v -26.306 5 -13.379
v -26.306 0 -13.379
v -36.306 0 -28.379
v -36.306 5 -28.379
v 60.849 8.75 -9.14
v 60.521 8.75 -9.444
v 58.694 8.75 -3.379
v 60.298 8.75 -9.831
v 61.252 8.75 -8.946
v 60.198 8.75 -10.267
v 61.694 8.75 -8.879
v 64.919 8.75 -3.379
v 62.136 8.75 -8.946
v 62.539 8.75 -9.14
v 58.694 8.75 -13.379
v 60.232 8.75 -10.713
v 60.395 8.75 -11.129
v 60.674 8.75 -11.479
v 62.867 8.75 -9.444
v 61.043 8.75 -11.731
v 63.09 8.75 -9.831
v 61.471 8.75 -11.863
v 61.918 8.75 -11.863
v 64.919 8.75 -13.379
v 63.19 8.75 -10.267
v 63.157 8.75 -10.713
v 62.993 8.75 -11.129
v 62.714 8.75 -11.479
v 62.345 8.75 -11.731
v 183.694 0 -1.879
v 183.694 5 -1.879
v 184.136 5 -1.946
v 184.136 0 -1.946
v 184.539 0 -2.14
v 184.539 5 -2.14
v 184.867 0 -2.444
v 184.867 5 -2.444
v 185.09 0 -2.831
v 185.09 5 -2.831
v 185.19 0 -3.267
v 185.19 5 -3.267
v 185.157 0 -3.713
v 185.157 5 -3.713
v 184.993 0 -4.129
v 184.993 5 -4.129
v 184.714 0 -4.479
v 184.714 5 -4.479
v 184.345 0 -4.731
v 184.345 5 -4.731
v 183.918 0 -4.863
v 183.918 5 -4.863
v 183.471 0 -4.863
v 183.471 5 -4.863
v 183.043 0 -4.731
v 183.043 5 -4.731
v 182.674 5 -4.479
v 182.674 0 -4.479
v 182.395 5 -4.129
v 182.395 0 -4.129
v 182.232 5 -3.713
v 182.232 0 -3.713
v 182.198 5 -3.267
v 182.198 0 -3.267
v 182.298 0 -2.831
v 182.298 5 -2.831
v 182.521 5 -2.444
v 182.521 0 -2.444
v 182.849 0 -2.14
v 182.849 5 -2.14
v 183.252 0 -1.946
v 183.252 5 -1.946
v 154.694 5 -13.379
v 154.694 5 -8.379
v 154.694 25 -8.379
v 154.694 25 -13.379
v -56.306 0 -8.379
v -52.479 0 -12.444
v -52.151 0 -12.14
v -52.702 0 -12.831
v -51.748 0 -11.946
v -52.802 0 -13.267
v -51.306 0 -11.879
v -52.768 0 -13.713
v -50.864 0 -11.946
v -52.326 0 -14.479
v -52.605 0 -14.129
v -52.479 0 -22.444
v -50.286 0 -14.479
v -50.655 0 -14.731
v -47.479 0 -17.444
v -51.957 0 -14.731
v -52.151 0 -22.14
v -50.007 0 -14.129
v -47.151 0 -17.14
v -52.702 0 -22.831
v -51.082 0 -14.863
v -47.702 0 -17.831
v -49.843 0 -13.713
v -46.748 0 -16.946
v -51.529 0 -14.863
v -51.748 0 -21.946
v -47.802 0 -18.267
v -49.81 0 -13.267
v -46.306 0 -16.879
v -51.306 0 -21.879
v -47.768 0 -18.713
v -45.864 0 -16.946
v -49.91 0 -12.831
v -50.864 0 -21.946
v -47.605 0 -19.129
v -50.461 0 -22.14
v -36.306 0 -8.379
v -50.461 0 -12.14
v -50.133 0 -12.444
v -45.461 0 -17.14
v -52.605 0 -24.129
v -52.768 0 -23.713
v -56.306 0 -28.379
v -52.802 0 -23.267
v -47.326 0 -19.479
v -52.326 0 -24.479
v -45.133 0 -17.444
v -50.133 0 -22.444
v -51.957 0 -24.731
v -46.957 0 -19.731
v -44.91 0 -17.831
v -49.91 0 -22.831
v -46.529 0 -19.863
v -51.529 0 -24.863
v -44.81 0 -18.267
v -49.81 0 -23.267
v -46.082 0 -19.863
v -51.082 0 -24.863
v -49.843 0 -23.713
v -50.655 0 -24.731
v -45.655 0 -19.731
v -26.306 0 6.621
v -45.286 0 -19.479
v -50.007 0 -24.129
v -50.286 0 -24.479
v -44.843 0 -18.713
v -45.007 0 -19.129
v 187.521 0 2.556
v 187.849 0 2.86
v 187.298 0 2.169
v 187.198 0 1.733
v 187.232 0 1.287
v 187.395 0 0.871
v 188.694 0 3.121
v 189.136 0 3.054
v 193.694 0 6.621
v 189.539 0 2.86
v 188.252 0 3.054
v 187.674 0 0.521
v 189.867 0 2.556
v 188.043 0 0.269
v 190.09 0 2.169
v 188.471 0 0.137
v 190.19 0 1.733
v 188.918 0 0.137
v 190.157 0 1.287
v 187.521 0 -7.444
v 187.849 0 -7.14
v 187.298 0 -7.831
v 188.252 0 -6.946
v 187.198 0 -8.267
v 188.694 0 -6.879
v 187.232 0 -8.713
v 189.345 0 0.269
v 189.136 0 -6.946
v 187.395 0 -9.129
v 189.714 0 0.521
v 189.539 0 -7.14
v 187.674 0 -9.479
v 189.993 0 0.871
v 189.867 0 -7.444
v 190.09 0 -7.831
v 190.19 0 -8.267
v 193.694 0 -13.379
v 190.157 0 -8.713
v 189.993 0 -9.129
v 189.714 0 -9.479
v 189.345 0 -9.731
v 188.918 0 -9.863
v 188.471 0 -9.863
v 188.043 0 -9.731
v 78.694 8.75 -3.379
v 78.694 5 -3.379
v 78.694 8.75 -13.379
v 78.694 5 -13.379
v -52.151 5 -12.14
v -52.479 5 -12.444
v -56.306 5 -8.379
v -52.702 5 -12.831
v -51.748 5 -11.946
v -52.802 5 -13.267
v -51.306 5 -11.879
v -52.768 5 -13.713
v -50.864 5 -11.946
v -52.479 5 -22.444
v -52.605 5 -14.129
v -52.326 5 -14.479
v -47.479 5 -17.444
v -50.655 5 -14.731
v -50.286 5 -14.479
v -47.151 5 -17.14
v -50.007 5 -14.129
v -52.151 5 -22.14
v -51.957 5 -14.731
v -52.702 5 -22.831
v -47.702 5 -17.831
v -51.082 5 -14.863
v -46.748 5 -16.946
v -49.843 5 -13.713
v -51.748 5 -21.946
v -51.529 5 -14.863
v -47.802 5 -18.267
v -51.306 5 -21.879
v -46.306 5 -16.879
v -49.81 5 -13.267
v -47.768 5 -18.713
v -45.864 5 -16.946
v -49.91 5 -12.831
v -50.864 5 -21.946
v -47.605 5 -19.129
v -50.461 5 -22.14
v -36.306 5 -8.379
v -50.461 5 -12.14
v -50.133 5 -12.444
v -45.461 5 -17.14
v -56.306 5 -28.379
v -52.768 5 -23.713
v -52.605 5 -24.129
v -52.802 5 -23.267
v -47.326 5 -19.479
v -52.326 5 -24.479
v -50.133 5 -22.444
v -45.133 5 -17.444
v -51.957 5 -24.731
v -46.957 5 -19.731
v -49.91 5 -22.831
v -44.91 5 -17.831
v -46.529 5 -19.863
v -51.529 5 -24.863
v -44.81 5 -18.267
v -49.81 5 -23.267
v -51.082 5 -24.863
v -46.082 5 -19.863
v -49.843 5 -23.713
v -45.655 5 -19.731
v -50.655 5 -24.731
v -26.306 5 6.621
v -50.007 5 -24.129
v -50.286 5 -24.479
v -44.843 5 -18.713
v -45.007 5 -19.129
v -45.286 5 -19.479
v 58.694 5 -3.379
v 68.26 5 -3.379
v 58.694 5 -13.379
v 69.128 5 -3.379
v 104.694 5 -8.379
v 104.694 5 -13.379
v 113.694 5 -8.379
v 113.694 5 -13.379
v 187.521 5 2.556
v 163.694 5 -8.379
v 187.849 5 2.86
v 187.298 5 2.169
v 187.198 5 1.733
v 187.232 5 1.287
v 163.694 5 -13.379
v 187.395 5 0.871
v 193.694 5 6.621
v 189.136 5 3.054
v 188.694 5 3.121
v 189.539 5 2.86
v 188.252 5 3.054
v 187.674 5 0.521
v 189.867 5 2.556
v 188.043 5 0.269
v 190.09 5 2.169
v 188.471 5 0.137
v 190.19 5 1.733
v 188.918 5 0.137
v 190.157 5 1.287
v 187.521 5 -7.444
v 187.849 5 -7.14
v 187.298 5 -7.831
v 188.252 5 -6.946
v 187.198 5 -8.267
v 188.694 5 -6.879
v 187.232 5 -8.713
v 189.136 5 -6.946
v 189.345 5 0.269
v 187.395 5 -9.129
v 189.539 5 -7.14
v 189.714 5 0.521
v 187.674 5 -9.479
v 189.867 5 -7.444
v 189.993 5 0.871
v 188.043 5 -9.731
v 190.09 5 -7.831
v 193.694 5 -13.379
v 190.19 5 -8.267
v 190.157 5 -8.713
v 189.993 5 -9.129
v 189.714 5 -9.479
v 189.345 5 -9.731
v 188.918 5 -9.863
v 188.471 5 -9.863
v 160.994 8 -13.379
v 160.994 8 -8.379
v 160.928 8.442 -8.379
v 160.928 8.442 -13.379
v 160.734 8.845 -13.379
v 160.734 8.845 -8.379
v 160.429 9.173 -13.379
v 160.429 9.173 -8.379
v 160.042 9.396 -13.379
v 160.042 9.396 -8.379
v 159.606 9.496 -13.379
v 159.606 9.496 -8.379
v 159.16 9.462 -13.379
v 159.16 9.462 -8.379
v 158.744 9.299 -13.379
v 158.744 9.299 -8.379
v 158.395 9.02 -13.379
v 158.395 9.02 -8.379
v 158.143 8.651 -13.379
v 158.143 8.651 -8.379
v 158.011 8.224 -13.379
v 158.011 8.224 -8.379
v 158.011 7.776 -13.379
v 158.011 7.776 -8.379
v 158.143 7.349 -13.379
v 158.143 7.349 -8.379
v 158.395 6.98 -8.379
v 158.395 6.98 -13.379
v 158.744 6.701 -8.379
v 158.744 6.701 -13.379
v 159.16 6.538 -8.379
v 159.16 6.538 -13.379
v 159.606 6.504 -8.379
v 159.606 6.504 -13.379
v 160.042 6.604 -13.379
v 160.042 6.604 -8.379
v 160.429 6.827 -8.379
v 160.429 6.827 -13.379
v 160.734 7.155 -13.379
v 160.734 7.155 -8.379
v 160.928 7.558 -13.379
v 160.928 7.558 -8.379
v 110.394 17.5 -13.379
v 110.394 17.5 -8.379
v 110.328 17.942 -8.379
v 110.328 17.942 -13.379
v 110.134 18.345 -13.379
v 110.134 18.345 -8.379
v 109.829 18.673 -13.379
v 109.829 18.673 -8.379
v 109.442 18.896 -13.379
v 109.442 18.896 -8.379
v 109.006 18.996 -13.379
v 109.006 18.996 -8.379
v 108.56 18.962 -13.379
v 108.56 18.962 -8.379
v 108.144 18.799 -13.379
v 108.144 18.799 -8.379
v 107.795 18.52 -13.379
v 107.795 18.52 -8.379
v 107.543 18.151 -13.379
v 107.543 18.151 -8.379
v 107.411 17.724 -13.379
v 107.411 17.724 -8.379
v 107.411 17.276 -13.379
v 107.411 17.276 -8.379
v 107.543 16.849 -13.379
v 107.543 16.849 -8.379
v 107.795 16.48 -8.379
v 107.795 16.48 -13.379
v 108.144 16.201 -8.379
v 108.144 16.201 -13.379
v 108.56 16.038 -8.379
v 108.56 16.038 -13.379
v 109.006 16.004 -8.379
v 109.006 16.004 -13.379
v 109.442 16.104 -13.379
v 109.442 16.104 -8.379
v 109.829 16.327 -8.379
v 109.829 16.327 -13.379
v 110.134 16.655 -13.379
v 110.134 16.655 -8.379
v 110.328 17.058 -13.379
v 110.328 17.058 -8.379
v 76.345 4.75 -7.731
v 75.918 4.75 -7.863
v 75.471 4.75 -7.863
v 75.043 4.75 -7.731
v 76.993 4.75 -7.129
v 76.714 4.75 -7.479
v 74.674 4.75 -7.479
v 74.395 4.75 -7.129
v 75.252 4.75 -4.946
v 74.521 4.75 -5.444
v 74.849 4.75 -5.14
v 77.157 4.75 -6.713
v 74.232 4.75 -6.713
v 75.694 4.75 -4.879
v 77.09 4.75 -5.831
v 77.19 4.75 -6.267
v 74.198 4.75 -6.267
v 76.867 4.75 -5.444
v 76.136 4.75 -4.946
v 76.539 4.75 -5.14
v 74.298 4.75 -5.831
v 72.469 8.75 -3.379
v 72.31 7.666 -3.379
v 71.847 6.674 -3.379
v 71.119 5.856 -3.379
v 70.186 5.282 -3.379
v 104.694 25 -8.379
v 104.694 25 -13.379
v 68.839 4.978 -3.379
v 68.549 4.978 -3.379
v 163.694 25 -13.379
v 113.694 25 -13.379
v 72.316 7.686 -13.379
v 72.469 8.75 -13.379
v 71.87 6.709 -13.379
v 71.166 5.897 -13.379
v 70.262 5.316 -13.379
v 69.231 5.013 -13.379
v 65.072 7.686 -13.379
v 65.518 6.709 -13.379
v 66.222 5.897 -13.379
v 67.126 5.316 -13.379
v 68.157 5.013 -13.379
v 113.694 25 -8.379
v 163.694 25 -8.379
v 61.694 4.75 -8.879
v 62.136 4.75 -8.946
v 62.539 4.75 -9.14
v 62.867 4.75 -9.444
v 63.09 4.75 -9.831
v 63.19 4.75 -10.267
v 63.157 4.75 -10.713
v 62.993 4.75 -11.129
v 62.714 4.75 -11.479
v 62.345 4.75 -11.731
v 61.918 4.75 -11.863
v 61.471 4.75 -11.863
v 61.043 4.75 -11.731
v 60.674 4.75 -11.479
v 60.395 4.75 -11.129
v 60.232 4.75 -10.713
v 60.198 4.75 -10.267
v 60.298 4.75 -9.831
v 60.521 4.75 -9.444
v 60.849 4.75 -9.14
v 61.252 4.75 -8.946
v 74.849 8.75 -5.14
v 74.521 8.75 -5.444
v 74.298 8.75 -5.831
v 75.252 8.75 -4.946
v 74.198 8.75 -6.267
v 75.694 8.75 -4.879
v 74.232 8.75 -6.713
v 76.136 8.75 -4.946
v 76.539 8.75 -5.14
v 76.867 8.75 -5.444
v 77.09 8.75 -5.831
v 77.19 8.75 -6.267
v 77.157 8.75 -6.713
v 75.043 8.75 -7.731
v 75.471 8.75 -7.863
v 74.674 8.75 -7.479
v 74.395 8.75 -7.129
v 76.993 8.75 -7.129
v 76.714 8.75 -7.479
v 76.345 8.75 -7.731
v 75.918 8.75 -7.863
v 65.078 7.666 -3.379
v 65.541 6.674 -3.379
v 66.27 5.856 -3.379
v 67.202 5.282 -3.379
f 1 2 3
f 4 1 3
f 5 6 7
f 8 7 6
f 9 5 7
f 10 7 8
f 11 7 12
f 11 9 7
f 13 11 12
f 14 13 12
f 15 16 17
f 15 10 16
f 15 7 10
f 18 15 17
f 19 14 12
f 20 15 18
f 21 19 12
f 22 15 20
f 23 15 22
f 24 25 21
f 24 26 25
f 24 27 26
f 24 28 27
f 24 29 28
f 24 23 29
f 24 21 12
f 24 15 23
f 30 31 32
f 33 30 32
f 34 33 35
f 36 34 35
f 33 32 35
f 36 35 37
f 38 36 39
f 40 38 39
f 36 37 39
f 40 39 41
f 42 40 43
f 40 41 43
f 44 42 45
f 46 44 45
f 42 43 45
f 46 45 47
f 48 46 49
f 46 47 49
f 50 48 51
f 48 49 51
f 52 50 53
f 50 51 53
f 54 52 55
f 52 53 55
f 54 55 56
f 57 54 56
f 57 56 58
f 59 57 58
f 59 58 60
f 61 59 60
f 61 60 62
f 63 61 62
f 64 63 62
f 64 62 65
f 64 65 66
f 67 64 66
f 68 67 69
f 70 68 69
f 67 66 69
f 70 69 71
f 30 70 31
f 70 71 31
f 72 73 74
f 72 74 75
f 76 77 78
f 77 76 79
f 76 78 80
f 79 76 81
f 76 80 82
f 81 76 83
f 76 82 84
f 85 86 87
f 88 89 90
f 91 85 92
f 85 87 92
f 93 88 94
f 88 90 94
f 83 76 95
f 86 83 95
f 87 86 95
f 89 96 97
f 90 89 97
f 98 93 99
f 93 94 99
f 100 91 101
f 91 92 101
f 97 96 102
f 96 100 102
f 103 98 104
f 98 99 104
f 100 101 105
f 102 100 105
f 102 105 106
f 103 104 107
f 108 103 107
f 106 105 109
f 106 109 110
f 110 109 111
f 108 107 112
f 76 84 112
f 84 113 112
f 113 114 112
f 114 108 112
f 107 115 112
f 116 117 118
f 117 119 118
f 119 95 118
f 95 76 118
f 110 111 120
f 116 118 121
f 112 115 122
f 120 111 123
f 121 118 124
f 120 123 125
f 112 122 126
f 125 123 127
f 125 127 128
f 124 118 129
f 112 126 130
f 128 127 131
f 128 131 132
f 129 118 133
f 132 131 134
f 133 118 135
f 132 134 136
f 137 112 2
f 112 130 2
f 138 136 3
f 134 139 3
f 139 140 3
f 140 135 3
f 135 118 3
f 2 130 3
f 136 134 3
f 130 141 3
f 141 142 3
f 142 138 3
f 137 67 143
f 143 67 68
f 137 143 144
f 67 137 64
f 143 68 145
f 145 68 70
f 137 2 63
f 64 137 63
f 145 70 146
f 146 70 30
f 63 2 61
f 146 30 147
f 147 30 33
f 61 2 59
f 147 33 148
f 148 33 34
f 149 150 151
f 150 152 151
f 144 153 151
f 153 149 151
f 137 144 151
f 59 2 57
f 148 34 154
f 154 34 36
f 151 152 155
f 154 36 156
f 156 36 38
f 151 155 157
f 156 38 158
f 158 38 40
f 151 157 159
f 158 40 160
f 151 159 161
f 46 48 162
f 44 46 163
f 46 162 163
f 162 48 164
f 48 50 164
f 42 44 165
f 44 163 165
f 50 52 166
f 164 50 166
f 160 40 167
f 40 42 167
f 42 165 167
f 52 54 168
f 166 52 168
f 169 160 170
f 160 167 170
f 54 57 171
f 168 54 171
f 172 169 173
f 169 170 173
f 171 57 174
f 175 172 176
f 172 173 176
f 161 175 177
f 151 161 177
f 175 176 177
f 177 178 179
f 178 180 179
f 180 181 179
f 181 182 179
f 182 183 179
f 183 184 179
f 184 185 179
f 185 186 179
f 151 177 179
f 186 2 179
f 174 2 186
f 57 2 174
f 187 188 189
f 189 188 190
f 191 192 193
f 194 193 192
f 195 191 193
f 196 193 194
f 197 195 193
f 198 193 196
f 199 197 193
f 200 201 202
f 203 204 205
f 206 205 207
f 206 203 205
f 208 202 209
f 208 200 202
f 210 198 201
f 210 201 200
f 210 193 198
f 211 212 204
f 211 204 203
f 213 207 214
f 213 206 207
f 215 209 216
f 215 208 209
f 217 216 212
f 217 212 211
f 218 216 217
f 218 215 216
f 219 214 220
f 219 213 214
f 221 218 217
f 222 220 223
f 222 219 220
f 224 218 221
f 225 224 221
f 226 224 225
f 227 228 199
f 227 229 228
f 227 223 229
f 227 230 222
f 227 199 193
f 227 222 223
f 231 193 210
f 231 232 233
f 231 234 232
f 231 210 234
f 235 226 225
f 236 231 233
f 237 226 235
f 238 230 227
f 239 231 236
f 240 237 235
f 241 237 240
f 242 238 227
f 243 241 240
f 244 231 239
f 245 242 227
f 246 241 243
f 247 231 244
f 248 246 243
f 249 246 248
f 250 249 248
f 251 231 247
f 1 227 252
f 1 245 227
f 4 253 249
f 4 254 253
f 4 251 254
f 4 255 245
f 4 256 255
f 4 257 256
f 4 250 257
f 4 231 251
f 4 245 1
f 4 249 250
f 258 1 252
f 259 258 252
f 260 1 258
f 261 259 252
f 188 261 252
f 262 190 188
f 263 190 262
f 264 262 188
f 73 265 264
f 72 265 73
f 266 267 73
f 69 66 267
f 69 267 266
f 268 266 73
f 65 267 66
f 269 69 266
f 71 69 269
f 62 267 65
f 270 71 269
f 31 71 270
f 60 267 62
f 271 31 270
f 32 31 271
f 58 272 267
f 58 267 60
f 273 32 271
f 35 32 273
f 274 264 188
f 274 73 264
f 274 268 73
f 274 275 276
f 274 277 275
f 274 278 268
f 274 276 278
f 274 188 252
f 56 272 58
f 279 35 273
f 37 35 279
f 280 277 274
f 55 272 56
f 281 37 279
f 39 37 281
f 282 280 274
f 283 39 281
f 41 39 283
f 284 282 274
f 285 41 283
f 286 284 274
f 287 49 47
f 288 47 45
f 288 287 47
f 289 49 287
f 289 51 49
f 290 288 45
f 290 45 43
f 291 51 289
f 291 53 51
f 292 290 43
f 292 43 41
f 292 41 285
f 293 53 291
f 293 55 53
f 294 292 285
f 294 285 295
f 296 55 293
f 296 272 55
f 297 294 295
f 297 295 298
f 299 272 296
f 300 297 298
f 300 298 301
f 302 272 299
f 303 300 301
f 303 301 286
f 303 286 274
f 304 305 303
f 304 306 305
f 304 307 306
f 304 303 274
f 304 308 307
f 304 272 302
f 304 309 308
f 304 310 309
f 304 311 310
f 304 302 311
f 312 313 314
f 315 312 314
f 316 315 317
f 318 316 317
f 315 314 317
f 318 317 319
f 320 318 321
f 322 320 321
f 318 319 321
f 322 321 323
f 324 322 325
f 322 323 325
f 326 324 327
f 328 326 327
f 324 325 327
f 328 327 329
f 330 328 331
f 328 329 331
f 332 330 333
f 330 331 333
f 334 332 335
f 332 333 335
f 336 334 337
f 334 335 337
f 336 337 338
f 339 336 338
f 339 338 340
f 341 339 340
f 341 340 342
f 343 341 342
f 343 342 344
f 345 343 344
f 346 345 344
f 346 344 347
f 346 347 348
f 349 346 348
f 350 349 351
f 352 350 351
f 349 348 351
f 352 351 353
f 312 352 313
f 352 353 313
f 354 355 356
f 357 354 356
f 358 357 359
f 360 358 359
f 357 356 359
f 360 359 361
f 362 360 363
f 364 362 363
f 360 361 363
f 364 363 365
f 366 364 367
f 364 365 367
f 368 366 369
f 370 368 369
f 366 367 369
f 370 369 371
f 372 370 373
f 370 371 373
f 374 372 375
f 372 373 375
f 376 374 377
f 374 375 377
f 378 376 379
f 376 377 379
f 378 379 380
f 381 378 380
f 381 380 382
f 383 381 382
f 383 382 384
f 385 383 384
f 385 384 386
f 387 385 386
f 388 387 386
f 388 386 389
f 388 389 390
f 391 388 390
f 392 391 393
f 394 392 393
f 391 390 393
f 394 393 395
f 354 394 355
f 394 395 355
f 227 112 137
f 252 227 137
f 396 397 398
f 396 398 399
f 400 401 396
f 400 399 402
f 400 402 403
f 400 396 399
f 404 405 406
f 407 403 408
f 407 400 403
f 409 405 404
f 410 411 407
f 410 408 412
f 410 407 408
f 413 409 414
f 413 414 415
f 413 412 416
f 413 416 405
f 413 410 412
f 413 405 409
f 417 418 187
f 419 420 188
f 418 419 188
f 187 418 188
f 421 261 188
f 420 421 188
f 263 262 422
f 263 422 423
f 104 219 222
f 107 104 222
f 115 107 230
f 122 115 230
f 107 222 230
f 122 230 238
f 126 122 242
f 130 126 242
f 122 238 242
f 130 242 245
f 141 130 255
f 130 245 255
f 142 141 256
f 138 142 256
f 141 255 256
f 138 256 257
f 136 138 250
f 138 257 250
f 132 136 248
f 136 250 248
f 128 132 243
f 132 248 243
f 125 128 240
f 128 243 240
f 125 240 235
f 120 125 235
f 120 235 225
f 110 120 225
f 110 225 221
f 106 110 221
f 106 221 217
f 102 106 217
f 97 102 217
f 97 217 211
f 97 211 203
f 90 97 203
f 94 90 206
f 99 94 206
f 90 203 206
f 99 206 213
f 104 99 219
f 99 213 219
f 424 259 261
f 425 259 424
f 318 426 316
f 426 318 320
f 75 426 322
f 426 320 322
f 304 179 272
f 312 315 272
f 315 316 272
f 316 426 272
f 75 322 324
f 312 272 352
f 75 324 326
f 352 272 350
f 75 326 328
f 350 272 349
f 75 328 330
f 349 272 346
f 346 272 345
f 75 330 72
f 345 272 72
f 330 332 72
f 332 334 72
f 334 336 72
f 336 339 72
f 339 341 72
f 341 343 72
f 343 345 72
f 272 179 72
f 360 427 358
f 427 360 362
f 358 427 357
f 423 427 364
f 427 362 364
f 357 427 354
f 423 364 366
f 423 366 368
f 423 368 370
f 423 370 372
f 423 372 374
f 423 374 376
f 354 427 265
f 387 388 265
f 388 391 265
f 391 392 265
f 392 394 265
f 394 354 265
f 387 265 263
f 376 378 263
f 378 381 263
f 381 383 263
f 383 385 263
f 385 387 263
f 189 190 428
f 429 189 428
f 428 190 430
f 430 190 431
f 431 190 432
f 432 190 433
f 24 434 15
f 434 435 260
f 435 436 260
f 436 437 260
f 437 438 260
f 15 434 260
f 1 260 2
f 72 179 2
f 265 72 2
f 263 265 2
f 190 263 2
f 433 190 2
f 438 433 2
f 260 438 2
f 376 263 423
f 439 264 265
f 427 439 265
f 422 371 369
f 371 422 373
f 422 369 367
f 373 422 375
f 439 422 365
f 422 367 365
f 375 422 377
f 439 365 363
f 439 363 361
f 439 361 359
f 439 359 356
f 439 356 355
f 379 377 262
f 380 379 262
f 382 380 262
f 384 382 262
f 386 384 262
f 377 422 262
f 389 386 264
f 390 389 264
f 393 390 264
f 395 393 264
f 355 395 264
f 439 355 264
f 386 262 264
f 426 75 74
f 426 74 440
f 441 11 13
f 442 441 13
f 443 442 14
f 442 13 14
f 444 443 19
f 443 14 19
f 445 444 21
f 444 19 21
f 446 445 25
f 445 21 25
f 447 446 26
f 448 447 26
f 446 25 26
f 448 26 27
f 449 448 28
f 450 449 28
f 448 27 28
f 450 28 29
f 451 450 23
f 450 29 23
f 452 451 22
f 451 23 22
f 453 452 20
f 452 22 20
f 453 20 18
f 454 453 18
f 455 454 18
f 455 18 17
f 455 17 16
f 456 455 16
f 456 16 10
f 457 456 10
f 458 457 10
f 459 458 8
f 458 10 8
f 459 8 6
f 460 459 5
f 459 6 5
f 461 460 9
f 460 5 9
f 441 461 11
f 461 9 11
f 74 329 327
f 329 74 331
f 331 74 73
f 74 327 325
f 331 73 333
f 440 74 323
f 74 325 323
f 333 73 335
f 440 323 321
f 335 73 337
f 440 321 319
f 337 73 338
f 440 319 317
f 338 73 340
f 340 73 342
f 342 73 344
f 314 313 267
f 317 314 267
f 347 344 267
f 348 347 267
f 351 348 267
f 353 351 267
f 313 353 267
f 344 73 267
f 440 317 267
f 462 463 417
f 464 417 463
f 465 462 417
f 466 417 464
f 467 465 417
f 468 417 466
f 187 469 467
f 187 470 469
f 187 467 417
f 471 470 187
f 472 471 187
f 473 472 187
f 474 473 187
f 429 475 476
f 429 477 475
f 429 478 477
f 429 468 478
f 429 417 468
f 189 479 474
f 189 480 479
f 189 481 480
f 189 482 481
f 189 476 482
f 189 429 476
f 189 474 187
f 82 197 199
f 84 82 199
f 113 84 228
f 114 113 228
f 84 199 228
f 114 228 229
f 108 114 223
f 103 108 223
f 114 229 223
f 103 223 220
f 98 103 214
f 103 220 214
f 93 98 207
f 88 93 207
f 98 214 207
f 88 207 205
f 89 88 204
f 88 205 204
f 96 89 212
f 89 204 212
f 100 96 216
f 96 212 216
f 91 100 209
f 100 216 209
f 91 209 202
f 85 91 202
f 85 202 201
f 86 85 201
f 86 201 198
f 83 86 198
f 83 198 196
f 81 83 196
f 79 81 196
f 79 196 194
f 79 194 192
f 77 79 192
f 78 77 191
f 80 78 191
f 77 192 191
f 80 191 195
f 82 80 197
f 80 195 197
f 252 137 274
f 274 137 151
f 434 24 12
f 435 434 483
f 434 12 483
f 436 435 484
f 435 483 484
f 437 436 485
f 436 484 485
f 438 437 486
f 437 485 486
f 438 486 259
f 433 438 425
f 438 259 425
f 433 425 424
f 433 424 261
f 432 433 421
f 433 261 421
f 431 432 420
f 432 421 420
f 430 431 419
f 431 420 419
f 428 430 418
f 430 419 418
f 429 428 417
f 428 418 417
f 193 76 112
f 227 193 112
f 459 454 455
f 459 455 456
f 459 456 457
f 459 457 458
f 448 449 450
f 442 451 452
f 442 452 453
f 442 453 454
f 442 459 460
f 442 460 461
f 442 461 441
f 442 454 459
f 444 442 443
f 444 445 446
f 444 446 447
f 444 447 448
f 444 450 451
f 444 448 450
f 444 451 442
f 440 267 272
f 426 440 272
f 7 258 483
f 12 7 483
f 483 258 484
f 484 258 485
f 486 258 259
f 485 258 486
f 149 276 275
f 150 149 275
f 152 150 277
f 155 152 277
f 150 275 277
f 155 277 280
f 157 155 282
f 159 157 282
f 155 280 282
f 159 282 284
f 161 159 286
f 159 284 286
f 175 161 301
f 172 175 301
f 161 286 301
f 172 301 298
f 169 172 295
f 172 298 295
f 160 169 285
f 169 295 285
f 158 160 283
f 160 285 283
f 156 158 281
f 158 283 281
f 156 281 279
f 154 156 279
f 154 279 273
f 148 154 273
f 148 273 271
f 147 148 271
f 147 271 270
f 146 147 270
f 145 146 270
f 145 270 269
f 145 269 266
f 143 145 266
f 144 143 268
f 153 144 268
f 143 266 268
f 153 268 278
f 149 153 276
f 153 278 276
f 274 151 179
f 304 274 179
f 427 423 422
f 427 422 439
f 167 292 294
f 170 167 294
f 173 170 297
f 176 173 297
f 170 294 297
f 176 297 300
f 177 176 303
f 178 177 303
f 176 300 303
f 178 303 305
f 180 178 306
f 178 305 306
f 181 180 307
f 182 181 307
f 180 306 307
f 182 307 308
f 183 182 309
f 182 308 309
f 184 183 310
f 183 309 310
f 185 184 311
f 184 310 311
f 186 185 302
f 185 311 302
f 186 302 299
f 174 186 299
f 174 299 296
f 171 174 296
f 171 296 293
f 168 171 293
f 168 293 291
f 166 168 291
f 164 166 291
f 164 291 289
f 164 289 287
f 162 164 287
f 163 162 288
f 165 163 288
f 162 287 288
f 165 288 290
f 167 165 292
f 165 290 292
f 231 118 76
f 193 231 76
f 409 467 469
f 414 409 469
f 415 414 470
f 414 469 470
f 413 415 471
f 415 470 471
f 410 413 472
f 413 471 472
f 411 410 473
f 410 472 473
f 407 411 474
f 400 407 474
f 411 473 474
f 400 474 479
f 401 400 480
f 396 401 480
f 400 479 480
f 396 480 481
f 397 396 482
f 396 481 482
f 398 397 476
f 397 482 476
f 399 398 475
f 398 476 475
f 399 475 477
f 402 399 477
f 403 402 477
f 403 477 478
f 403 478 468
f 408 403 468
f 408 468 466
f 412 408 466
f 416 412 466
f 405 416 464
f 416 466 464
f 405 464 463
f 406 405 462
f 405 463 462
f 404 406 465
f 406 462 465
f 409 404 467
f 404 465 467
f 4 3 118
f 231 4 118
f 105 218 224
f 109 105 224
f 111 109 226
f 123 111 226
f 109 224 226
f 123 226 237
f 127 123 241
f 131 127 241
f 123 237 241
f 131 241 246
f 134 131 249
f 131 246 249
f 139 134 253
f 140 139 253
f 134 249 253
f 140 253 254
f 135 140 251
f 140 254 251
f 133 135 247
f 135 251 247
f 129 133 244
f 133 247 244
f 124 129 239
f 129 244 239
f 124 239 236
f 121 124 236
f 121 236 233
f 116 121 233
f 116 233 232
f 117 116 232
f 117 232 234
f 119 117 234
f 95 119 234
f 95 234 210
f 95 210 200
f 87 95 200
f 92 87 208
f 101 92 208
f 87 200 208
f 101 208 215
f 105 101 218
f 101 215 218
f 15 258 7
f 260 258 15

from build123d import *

# Parameters (mm, degrees)
BOSS_EXTRUDE1_DEPTH = 5
SKETCH2_W           = 20
SKETCH2_H           = 10
BOSS_EXTRUDE2_DEPTH = 3.75
SKETCH3_R           = 3.775
CUT_EXTRUDE1_DEPTH  = 10
SKETCH7_R           = 1.5
CUT_EXTRUDE3_DEPTH  = 5
SKETCH4_R           = 1.5
CUT_EXTRUDE2_DEPTH  = 4
SKETCH8_W           = 9
SKETCH8_H           = 5
BOSS_EXTRUDE3_DEPTH = 20
SKETCH9_R           = 1.5
CUT_EXTRUDE4_DEPTH  = 5


with BuildPart() as part:
    # Sketch1 → Boss-Extrude1 (new body)
    with BuildSketch(Plane(origin=(0, 0, 0), x_dir=(1, 0, 0), z_dir=(0, 1, 0))):
        Polygon((-26.305830051, -6.620550836), (193.694169949, -6.620550836), (193.694169949, 13.379449164), (-26.305830051, 13.379449164), (-36.305830051, 28.379449164), (-56.305830051, 28.379449164), (-56.305830051, 8.379449164), (-36.305830051, 8.379449164), align=None)
    extrude(amount=BOSS_EXTRUDE1_DEPTH)

    # Sketch2 → Boss-Extrude2 (add)
    with BuildSketch(Plane(origin=(0, 5, 0), x_dir=(1, 0, 0), z_dir=(0, 1, 0))):
        with Locations((68.694169949, 8.379449164)):
            Rectangle(SKETCH2_W, SKETCH2_H)
    extrude(amount=BOSS_EXTRUDE2_DEPTH)

    # Sketch3 → Cut-Extrude1 (cut)
    with BuildSketch(Plane.XY.offset(-3.379449164)):
        with Locations((68.694169949, 8.75)):
            Circle(SKETCH3_R)
    extrude(amount=-CUT_EXTRUDE1_DEPTH, mode=Mode.SUBTRACT)

    # Sketch7 → Cut-Extrude3 (cut)
    with BuildSketch(Plane(origin=(0, 5, 0), x_dir=(1, 0, 0), z_dir=(0, 1, 0))):
        with Locations(Location((-51.305830051, 23.379449164, 0), (0, 0, 270))):
            Circle(SKETCH7_R)
        with Locations(Location((-51.305830051, 13.379449164, 0), (0, 0, 270))):
            Circle(SKETCH7_R)
        with Locations(Location((188.694169949, -1.620550836, 0), (0, 0, 270))):
            Circle(SKETCH7_R)
        with Locations(Location((188.694169949, 8.379449164, 0), (0, 0, 270))):
            Circle(SKETCH7_R)
        with Locations(Location((183.694169949, 3.379449164, 0), (0, 0, 270))):
            Circle(SKETCH7_R)
        with Locations(Location((-46.305830051, 18.379449164, 0), (0, 0, 270))):
            Circle(SKETCH7_R)
    extrude(amount=-CUT_EXTRUDE3_DEPTH, mode=Mode.SUBTRACT)

    # Sketch4 → Cut-Extrude2 (cut)
    with BuildSketch(Plane(origin=(0, 8.75, 0), x_dir=(1, 0, 0), z_dir=(0, 1, 0))):
        with Locations(Location((75.694169949, 6.379449164, 0), (0, 0, 270))):
            Circle(SKETCH4_R)
        with Locations(Location((61.694169949, 10.379449164, 0), (0, 0, 270))):
            Circle(SKETCH4_R)
    extrude(amount=-CUT_EXTRUDE2_DEPTH, mode=Mode.SUBTRACT)

    # Sketch8 → Boss-Extrude3 (add)
    with BuildSketch(Plane(origin=(0, 5, 0), x_dir=(1, 0, 0), z_dir=(0, 1, 0))):
        with Locations((109.194169949, 10.879449164)):
            Rectangle(SKETCH8_W, SKETCH8_H)
        with Locations((159.194169949, 10.879449164)):
            Rectangle(SKETCH8_W, SKETCH8_H)
    extrude(amount=BOSS_EXTRUDE3_DEPTH)

    # Sketch9 → Cut-Extrude4 (cut)
    with BuildSketch(Plane.XY.offset(-8.379449164)):
        with Locations((108.894169949, 17.5)):
            Circle(SKETCH9_R)
        with Locations((159.494169949, 8)):
            Circle(SKETCH9_R)
    extrude(amount=-CUT_EXTRUDE4_DEPTH, mode=Mode.SUBTRACT)


solid = part.part
